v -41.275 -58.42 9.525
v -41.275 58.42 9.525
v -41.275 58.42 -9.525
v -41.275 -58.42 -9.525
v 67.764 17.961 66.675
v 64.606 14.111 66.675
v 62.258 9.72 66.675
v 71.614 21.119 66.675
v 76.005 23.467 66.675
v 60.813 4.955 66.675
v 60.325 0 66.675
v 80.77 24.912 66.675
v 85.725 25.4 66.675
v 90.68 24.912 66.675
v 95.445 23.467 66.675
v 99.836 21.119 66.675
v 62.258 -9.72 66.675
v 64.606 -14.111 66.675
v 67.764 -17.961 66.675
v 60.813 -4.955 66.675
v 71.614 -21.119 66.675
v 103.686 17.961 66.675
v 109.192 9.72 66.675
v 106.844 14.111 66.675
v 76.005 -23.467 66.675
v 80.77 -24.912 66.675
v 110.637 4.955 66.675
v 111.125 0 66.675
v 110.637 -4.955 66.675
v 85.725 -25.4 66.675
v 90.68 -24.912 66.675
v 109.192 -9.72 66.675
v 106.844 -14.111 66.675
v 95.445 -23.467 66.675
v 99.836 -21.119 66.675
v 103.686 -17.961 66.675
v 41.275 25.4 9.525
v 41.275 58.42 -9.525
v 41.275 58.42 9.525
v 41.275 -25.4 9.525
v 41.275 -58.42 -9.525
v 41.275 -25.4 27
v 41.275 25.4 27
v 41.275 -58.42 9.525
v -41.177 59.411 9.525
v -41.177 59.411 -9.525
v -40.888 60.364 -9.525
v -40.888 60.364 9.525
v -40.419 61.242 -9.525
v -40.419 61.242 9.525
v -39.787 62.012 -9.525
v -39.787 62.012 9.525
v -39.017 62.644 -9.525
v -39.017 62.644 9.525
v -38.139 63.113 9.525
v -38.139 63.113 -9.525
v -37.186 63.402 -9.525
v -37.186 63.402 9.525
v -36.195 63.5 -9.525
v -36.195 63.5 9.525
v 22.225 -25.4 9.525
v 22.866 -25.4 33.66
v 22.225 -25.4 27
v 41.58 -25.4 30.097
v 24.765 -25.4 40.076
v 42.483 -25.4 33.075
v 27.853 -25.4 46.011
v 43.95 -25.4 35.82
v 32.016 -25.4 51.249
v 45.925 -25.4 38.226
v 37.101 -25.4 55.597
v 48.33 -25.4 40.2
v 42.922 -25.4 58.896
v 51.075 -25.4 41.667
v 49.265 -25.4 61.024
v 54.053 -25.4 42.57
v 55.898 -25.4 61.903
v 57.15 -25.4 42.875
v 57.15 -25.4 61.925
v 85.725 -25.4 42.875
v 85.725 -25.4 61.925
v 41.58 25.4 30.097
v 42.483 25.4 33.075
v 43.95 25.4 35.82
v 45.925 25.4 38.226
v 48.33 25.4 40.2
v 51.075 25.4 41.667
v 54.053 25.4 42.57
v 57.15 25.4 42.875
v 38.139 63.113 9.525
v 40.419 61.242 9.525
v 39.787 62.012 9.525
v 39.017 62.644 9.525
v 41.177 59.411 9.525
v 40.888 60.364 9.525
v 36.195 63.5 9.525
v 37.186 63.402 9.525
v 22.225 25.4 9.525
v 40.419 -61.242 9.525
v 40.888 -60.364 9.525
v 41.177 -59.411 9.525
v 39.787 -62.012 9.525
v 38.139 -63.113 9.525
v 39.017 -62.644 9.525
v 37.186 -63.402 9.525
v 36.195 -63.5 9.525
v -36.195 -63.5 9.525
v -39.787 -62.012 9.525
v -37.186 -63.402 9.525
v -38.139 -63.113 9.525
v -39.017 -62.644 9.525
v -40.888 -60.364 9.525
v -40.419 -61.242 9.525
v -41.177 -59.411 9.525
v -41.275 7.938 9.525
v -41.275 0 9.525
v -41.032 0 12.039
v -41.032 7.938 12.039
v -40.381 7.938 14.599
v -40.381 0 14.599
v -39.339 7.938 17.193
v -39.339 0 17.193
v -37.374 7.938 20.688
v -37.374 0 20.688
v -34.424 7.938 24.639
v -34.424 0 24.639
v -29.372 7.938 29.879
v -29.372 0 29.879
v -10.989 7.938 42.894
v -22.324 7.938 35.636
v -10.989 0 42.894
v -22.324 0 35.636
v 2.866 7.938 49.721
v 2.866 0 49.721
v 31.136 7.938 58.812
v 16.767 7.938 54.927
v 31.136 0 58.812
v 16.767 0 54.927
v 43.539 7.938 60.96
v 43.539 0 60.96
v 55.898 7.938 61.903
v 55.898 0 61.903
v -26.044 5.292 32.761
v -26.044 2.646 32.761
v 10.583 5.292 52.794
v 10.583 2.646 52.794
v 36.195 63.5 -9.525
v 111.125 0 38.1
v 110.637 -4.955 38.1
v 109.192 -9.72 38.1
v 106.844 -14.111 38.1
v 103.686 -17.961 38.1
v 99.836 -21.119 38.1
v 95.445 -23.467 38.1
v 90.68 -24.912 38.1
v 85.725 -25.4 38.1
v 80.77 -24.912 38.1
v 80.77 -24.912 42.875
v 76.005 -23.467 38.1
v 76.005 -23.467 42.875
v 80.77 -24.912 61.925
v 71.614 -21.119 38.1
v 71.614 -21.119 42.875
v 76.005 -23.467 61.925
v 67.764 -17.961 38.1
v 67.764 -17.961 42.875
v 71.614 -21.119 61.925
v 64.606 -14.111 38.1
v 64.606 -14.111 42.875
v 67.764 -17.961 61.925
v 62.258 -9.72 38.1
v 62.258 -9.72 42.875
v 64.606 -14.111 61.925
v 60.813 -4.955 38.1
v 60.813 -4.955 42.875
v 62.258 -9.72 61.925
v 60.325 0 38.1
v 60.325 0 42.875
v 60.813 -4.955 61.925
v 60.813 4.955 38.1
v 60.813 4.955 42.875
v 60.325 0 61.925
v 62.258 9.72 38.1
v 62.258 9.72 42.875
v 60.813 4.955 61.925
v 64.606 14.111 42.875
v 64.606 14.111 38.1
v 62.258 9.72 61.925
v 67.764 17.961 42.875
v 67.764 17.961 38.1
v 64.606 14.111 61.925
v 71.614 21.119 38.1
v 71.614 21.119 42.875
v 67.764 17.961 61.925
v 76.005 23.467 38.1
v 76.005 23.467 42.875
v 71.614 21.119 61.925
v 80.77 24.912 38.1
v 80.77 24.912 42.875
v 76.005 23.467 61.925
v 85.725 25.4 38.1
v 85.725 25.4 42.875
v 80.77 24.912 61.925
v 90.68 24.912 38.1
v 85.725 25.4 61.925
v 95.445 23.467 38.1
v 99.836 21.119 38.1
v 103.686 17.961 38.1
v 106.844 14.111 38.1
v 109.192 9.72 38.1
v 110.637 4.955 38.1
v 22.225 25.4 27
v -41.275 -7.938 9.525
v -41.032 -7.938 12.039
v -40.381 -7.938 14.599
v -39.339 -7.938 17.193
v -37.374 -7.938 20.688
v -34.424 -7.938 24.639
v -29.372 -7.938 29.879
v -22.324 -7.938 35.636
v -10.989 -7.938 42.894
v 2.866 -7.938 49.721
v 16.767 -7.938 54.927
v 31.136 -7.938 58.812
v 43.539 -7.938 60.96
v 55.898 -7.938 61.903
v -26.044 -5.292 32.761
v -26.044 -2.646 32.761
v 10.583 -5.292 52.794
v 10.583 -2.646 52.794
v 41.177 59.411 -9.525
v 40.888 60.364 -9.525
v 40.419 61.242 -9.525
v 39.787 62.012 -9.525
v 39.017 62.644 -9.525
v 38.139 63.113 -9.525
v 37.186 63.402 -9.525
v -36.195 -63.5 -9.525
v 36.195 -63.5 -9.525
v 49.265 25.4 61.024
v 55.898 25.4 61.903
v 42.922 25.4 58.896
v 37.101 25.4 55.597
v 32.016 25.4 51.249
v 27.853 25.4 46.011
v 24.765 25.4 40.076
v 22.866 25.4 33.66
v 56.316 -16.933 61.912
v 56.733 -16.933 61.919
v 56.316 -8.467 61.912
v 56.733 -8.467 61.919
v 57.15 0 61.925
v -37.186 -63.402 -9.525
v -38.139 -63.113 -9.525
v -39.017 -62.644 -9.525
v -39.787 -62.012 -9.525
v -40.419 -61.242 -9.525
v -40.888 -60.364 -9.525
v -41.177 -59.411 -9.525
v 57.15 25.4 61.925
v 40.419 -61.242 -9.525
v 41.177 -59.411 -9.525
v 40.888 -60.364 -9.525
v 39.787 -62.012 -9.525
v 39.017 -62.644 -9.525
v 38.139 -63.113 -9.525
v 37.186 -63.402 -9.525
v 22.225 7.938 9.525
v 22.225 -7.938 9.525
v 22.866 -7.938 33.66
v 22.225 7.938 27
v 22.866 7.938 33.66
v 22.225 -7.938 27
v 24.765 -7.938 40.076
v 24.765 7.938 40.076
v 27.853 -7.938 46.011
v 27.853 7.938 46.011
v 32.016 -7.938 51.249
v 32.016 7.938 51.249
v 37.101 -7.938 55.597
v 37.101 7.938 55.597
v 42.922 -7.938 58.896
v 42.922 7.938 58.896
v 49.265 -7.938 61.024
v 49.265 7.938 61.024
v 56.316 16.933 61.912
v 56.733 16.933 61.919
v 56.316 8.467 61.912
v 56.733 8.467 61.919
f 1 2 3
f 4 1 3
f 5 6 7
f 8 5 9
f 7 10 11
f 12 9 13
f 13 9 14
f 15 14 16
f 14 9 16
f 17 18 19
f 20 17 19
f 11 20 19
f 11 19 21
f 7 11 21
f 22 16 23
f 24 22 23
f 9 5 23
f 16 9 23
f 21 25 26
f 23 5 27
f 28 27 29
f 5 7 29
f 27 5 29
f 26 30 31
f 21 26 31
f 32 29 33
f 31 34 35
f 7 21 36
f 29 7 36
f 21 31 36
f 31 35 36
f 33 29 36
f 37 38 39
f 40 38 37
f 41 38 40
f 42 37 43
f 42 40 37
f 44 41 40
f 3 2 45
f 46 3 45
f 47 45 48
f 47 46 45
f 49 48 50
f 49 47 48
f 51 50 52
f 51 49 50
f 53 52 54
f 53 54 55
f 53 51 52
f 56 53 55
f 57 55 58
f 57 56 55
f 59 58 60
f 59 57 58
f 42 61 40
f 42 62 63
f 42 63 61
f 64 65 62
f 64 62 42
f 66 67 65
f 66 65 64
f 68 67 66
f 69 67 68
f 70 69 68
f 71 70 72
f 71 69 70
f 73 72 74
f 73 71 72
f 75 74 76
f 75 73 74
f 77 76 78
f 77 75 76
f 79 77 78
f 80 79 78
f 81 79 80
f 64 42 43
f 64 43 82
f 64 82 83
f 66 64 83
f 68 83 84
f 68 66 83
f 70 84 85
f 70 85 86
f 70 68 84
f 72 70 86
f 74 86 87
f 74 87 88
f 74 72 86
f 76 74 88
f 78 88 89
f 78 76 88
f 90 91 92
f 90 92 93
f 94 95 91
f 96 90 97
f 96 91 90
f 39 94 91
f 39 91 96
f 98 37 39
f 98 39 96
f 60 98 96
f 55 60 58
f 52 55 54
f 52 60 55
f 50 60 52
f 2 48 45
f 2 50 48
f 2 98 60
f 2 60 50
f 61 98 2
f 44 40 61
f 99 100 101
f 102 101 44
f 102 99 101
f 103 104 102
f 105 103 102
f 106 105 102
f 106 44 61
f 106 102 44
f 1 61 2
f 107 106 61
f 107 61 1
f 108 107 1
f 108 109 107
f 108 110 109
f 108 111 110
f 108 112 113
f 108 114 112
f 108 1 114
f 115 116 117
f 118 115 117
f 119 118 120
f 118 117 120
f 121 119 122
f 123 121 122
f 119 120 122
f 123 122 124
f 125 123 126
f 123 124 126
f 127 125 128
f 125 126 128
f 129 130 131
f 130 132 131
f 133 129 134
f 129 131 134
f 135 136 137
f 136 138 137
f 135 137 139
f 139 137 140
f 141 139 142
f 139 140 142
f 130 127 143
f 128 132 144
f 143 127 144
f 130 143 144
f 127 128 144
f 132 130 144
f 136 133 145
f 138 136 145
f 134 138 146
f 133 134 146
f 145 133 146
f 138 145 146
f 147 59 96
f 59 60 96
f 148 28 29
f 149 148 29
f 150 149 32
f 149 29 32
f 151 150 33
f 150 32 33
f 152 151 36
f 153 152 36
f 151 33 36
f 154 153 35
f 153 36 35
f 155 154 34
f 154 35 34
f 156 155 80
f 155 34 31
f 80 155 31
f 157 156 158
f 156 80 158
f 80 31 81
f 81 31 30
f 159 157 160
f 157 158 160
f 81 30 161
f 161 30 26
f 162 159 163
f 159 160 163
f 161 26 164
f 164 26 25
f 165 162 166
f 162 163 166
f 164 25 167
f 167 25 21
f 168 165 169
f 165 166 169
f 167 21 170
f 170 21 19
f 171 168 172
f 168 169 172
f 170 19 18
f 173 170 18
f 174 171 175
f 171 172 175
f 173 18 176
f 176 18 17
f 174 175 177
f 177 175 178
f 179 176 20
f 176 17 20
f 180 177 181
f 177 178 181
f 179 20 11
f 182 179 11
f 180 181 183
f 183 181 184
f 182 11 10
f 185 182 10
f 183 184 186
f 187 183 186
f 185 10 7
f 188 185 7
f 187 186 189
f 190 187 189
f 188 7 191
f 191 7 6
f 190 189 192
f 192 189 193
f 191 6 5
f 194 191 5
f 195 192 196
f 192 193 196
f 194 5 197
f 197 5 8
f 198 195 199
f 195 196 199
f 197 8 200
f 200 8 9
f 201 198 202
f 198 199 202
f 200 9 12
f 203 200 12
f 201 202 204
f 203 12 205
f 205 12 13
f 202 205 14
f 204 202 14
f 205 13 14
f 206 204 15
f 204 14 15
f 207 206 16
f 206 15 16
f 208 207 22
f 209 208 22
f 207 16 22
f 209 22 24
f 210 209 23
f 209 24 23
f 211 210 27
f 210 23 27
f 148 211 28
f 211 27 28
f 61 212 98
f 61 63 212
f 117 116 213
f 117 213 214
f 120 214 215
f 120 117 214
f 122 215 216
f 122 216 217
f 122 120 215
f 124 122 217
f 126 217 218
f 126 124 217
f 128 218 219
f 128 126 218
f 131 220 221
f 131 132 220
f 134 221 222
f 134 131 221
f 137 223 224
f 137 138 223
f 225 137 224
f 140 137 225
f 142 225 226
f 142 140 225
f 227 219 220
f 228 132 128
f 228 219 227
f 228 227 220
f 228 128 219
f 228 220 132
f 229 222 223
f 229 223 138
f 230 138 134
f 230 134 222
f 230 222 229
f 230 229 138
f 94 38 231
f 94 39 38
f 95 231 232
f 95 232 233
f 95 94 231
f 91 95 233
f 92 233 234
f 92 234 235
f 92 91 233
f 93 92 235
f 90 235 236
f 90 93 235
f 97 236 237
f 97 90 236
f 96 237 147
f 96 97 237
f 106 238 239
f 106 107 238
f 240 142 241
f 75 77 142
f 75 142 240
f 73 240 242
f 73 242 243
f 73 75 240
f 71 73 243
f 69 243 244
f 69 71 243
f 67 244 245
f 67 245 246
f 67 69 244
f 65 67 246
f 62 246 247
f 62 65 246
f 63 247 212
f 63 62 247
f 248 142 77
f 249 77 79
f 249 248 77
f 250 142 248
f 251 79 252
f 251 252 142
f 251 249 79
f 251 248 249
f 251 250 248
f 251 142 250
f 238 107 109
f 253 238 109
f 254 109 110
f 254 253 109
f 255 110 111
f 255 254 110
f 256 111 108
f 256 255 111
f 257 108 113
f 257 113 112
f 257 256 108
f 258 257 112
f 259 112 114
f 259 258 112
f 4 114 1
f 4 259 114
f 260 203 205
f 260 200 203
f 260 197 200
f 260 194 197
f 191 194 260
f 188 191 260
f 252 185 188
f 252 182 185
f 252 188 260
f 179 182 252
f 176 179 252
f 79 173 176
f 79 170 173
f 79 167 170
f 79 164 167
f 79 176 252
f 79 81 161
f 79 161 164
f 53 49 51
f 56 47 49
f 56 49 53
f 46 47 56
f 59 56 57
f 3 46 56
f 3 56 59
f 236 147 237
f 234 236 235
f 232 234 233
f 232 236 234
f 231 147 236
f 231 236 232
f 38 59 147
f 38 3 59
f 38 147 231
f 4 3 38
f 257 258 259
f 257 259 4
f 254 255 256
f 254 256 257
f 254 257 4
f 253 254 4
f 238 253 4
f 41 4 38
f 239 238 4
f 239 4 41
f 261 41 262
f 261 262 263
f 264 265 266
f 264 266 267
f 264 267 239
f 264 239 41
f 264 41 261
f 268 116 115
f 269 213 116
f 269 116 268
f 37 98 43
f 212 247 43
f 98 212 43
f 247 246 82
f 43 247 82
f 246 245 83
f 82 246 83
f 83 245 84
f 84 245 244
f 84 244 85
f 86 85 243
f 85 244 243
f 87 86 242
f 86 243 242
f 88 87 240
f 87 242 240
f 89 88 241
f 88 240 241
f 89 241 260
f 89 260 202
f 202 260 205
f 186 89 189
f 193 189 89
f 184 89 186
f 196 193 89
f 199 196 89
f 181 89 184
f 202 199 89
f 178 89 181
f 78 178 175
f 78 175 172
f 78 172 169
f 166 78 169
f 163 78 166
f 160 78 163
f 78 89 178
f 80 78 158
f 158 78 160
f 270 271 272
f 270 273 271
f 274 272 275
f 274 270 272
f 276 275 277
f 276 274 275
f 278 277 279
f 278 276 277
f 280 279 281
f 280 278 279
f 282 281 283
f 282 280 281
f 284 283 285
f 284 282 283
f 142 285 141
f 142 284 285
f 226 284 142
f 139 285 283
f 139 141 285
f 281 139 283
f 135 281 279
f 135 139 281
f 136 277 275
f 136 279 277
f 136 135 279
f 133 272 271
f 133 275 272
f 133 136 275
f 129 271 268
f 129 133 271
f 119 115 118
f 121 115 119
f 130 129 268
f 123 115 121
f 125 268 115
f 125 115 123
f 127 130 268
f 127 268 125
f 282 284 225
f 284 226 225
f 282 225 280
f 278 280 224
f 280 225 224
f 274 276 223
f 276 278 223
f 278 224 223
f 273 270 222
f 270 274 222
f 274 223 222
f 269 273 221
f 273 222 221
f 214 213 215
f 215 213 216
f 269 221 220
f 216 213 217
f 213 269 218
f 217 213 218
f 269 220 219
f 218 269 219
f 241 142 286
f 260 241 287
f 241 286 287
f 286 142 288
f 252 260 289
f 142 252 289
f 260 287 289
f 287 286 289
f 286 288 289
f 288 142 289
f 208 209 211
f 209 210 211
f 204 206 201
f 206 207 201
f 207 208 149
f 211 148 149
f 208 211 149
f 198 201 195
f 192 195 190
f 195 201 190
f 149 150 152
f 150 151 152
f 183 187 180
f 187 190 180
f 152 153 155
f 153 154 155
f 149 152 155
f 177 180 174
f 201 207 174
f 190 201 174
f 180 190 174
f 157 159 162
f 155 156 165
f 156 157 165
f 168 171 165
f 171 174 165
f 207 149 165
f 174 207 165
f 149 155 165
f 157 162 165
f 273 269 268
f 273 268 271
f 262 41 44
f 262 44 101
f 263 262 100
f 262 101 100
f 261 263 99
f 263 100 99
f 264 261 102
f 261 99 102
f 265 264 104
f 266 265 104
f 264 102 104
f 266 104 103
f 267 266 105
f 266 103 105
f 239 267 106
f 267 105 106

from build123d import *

# Parameters (mm, degrees)
F1_DEPTH = 63.5
F0_W     = 25.4
F0_H     = 19.05
F2_DEPTH = 25.4
F3_DEPTH = 7.9375
F5_R     = 5.08


with BuildPart() as f1:
    # F0 (on Front) → F1 (new body, symmetric)
    with BuildSketch(Plane.XZ):
        Polygon((-41.275, 9.525), (-41.275, -9.525), (41.275, -9.525), (41.275, 9.525), (22.225, 9.525), align=None)
    extrude(amount=F1_DEPTH, both=True)

    # F0 (on Front) → F2 (join, symmetric)
    with BuildSketch(Plane.XZ):
        with BuildLine():
            Line((22.225, 9.525), (41.275, 9.525))
            Line((41.275, 9.525), (41.275, 27.0002))
            ThreePointArc((41.275, 27.0002), (45.9246798487, 38.2255201513), (57.15, 42.8752))
            Line((57.15, 42.8752), (60.325, 42.8752))
            Line((60.325, 42.8752), (60.325, 61.9252))
            Line((60.325, 61.9252), (57.15, 61.9252))
            add(Edge.make_bspline(
                [(55.8981861571, 61.9027584607), (56.3159827124, 61.9126146059), (56.7332688293, 61.9201041343), (57.15, 61.9252)],
                knots=[110.4882520813, 110.4882520813, 110.4882520813, 110.4882520813, 111.5045361635, 111.5045361635, 111.5045361635, 111.5045361635], degree=3))
            ThreePointArc((55.8981861571, 61.9027584607), (32.0156089843, 51.2492827305), (22.225, 27.0002))
            Line((22.225, 27.0002), (22.225, 9.525))
        make_face()
        with Locations((73.025, 52.4002)):
            Rectangle(F0_W, F0_H)
    extrude(amount=F2_DEPTH, both=True)

    # F0 (on Front) → F4 (revolve)
    with BuildSketch(Plane.XZ):
        Polygon((85.725, 66.675), (85.725, 61.9252), (85.725, 42.8752), (85.725, 38.1), (111.125, 38.1), (111.125, 66.675), align=None)
    revolve(axis=Axis((85.725, 0, 52.3875), (0, 0, -1)))

    # F5
    f5_edges = [f1.edges().sort_by_distance(p)[0] for p in [
        (41.275, -63.5, 0),
        (-41.275, -63.5, 0),
        (41.275, 63.5, 0),
        (-41.275, 63.5, 0),
    ]]
    fillet(f5_edges, radius=F5_R)


with BuildPart() as f3:
    # F0 (on Front) → F3 (new body, symmetric)
    with BuildSketch(Plane.XZ):
        with BuildLine():
            add(Edge.make_bspline(
                [(-41.275, 9.525), (-40.978894068, 31.7872695715), (10.4762299043, 60.8312192408), (55.8981861571, 61.9027584607)],
                knots=[0, 0, 0, 0, 110.4882520813, 110.4882520813, 110.4882520813, 110.4882520813], degree=3))
            Line((-41.275, 9.525), (22.225, 9.525))
            Line((22.225, 9.525), (22.225, 27.0002))
            ThreePointArc((22.225, 27.0002), (32.0156089843, 51.2492827305), (55.8981861571, 61.9027584607))
        make_face()
    extrude(amount=F3_DEPTH, both=True)


solid = Compound([f1.part, f3.part])
